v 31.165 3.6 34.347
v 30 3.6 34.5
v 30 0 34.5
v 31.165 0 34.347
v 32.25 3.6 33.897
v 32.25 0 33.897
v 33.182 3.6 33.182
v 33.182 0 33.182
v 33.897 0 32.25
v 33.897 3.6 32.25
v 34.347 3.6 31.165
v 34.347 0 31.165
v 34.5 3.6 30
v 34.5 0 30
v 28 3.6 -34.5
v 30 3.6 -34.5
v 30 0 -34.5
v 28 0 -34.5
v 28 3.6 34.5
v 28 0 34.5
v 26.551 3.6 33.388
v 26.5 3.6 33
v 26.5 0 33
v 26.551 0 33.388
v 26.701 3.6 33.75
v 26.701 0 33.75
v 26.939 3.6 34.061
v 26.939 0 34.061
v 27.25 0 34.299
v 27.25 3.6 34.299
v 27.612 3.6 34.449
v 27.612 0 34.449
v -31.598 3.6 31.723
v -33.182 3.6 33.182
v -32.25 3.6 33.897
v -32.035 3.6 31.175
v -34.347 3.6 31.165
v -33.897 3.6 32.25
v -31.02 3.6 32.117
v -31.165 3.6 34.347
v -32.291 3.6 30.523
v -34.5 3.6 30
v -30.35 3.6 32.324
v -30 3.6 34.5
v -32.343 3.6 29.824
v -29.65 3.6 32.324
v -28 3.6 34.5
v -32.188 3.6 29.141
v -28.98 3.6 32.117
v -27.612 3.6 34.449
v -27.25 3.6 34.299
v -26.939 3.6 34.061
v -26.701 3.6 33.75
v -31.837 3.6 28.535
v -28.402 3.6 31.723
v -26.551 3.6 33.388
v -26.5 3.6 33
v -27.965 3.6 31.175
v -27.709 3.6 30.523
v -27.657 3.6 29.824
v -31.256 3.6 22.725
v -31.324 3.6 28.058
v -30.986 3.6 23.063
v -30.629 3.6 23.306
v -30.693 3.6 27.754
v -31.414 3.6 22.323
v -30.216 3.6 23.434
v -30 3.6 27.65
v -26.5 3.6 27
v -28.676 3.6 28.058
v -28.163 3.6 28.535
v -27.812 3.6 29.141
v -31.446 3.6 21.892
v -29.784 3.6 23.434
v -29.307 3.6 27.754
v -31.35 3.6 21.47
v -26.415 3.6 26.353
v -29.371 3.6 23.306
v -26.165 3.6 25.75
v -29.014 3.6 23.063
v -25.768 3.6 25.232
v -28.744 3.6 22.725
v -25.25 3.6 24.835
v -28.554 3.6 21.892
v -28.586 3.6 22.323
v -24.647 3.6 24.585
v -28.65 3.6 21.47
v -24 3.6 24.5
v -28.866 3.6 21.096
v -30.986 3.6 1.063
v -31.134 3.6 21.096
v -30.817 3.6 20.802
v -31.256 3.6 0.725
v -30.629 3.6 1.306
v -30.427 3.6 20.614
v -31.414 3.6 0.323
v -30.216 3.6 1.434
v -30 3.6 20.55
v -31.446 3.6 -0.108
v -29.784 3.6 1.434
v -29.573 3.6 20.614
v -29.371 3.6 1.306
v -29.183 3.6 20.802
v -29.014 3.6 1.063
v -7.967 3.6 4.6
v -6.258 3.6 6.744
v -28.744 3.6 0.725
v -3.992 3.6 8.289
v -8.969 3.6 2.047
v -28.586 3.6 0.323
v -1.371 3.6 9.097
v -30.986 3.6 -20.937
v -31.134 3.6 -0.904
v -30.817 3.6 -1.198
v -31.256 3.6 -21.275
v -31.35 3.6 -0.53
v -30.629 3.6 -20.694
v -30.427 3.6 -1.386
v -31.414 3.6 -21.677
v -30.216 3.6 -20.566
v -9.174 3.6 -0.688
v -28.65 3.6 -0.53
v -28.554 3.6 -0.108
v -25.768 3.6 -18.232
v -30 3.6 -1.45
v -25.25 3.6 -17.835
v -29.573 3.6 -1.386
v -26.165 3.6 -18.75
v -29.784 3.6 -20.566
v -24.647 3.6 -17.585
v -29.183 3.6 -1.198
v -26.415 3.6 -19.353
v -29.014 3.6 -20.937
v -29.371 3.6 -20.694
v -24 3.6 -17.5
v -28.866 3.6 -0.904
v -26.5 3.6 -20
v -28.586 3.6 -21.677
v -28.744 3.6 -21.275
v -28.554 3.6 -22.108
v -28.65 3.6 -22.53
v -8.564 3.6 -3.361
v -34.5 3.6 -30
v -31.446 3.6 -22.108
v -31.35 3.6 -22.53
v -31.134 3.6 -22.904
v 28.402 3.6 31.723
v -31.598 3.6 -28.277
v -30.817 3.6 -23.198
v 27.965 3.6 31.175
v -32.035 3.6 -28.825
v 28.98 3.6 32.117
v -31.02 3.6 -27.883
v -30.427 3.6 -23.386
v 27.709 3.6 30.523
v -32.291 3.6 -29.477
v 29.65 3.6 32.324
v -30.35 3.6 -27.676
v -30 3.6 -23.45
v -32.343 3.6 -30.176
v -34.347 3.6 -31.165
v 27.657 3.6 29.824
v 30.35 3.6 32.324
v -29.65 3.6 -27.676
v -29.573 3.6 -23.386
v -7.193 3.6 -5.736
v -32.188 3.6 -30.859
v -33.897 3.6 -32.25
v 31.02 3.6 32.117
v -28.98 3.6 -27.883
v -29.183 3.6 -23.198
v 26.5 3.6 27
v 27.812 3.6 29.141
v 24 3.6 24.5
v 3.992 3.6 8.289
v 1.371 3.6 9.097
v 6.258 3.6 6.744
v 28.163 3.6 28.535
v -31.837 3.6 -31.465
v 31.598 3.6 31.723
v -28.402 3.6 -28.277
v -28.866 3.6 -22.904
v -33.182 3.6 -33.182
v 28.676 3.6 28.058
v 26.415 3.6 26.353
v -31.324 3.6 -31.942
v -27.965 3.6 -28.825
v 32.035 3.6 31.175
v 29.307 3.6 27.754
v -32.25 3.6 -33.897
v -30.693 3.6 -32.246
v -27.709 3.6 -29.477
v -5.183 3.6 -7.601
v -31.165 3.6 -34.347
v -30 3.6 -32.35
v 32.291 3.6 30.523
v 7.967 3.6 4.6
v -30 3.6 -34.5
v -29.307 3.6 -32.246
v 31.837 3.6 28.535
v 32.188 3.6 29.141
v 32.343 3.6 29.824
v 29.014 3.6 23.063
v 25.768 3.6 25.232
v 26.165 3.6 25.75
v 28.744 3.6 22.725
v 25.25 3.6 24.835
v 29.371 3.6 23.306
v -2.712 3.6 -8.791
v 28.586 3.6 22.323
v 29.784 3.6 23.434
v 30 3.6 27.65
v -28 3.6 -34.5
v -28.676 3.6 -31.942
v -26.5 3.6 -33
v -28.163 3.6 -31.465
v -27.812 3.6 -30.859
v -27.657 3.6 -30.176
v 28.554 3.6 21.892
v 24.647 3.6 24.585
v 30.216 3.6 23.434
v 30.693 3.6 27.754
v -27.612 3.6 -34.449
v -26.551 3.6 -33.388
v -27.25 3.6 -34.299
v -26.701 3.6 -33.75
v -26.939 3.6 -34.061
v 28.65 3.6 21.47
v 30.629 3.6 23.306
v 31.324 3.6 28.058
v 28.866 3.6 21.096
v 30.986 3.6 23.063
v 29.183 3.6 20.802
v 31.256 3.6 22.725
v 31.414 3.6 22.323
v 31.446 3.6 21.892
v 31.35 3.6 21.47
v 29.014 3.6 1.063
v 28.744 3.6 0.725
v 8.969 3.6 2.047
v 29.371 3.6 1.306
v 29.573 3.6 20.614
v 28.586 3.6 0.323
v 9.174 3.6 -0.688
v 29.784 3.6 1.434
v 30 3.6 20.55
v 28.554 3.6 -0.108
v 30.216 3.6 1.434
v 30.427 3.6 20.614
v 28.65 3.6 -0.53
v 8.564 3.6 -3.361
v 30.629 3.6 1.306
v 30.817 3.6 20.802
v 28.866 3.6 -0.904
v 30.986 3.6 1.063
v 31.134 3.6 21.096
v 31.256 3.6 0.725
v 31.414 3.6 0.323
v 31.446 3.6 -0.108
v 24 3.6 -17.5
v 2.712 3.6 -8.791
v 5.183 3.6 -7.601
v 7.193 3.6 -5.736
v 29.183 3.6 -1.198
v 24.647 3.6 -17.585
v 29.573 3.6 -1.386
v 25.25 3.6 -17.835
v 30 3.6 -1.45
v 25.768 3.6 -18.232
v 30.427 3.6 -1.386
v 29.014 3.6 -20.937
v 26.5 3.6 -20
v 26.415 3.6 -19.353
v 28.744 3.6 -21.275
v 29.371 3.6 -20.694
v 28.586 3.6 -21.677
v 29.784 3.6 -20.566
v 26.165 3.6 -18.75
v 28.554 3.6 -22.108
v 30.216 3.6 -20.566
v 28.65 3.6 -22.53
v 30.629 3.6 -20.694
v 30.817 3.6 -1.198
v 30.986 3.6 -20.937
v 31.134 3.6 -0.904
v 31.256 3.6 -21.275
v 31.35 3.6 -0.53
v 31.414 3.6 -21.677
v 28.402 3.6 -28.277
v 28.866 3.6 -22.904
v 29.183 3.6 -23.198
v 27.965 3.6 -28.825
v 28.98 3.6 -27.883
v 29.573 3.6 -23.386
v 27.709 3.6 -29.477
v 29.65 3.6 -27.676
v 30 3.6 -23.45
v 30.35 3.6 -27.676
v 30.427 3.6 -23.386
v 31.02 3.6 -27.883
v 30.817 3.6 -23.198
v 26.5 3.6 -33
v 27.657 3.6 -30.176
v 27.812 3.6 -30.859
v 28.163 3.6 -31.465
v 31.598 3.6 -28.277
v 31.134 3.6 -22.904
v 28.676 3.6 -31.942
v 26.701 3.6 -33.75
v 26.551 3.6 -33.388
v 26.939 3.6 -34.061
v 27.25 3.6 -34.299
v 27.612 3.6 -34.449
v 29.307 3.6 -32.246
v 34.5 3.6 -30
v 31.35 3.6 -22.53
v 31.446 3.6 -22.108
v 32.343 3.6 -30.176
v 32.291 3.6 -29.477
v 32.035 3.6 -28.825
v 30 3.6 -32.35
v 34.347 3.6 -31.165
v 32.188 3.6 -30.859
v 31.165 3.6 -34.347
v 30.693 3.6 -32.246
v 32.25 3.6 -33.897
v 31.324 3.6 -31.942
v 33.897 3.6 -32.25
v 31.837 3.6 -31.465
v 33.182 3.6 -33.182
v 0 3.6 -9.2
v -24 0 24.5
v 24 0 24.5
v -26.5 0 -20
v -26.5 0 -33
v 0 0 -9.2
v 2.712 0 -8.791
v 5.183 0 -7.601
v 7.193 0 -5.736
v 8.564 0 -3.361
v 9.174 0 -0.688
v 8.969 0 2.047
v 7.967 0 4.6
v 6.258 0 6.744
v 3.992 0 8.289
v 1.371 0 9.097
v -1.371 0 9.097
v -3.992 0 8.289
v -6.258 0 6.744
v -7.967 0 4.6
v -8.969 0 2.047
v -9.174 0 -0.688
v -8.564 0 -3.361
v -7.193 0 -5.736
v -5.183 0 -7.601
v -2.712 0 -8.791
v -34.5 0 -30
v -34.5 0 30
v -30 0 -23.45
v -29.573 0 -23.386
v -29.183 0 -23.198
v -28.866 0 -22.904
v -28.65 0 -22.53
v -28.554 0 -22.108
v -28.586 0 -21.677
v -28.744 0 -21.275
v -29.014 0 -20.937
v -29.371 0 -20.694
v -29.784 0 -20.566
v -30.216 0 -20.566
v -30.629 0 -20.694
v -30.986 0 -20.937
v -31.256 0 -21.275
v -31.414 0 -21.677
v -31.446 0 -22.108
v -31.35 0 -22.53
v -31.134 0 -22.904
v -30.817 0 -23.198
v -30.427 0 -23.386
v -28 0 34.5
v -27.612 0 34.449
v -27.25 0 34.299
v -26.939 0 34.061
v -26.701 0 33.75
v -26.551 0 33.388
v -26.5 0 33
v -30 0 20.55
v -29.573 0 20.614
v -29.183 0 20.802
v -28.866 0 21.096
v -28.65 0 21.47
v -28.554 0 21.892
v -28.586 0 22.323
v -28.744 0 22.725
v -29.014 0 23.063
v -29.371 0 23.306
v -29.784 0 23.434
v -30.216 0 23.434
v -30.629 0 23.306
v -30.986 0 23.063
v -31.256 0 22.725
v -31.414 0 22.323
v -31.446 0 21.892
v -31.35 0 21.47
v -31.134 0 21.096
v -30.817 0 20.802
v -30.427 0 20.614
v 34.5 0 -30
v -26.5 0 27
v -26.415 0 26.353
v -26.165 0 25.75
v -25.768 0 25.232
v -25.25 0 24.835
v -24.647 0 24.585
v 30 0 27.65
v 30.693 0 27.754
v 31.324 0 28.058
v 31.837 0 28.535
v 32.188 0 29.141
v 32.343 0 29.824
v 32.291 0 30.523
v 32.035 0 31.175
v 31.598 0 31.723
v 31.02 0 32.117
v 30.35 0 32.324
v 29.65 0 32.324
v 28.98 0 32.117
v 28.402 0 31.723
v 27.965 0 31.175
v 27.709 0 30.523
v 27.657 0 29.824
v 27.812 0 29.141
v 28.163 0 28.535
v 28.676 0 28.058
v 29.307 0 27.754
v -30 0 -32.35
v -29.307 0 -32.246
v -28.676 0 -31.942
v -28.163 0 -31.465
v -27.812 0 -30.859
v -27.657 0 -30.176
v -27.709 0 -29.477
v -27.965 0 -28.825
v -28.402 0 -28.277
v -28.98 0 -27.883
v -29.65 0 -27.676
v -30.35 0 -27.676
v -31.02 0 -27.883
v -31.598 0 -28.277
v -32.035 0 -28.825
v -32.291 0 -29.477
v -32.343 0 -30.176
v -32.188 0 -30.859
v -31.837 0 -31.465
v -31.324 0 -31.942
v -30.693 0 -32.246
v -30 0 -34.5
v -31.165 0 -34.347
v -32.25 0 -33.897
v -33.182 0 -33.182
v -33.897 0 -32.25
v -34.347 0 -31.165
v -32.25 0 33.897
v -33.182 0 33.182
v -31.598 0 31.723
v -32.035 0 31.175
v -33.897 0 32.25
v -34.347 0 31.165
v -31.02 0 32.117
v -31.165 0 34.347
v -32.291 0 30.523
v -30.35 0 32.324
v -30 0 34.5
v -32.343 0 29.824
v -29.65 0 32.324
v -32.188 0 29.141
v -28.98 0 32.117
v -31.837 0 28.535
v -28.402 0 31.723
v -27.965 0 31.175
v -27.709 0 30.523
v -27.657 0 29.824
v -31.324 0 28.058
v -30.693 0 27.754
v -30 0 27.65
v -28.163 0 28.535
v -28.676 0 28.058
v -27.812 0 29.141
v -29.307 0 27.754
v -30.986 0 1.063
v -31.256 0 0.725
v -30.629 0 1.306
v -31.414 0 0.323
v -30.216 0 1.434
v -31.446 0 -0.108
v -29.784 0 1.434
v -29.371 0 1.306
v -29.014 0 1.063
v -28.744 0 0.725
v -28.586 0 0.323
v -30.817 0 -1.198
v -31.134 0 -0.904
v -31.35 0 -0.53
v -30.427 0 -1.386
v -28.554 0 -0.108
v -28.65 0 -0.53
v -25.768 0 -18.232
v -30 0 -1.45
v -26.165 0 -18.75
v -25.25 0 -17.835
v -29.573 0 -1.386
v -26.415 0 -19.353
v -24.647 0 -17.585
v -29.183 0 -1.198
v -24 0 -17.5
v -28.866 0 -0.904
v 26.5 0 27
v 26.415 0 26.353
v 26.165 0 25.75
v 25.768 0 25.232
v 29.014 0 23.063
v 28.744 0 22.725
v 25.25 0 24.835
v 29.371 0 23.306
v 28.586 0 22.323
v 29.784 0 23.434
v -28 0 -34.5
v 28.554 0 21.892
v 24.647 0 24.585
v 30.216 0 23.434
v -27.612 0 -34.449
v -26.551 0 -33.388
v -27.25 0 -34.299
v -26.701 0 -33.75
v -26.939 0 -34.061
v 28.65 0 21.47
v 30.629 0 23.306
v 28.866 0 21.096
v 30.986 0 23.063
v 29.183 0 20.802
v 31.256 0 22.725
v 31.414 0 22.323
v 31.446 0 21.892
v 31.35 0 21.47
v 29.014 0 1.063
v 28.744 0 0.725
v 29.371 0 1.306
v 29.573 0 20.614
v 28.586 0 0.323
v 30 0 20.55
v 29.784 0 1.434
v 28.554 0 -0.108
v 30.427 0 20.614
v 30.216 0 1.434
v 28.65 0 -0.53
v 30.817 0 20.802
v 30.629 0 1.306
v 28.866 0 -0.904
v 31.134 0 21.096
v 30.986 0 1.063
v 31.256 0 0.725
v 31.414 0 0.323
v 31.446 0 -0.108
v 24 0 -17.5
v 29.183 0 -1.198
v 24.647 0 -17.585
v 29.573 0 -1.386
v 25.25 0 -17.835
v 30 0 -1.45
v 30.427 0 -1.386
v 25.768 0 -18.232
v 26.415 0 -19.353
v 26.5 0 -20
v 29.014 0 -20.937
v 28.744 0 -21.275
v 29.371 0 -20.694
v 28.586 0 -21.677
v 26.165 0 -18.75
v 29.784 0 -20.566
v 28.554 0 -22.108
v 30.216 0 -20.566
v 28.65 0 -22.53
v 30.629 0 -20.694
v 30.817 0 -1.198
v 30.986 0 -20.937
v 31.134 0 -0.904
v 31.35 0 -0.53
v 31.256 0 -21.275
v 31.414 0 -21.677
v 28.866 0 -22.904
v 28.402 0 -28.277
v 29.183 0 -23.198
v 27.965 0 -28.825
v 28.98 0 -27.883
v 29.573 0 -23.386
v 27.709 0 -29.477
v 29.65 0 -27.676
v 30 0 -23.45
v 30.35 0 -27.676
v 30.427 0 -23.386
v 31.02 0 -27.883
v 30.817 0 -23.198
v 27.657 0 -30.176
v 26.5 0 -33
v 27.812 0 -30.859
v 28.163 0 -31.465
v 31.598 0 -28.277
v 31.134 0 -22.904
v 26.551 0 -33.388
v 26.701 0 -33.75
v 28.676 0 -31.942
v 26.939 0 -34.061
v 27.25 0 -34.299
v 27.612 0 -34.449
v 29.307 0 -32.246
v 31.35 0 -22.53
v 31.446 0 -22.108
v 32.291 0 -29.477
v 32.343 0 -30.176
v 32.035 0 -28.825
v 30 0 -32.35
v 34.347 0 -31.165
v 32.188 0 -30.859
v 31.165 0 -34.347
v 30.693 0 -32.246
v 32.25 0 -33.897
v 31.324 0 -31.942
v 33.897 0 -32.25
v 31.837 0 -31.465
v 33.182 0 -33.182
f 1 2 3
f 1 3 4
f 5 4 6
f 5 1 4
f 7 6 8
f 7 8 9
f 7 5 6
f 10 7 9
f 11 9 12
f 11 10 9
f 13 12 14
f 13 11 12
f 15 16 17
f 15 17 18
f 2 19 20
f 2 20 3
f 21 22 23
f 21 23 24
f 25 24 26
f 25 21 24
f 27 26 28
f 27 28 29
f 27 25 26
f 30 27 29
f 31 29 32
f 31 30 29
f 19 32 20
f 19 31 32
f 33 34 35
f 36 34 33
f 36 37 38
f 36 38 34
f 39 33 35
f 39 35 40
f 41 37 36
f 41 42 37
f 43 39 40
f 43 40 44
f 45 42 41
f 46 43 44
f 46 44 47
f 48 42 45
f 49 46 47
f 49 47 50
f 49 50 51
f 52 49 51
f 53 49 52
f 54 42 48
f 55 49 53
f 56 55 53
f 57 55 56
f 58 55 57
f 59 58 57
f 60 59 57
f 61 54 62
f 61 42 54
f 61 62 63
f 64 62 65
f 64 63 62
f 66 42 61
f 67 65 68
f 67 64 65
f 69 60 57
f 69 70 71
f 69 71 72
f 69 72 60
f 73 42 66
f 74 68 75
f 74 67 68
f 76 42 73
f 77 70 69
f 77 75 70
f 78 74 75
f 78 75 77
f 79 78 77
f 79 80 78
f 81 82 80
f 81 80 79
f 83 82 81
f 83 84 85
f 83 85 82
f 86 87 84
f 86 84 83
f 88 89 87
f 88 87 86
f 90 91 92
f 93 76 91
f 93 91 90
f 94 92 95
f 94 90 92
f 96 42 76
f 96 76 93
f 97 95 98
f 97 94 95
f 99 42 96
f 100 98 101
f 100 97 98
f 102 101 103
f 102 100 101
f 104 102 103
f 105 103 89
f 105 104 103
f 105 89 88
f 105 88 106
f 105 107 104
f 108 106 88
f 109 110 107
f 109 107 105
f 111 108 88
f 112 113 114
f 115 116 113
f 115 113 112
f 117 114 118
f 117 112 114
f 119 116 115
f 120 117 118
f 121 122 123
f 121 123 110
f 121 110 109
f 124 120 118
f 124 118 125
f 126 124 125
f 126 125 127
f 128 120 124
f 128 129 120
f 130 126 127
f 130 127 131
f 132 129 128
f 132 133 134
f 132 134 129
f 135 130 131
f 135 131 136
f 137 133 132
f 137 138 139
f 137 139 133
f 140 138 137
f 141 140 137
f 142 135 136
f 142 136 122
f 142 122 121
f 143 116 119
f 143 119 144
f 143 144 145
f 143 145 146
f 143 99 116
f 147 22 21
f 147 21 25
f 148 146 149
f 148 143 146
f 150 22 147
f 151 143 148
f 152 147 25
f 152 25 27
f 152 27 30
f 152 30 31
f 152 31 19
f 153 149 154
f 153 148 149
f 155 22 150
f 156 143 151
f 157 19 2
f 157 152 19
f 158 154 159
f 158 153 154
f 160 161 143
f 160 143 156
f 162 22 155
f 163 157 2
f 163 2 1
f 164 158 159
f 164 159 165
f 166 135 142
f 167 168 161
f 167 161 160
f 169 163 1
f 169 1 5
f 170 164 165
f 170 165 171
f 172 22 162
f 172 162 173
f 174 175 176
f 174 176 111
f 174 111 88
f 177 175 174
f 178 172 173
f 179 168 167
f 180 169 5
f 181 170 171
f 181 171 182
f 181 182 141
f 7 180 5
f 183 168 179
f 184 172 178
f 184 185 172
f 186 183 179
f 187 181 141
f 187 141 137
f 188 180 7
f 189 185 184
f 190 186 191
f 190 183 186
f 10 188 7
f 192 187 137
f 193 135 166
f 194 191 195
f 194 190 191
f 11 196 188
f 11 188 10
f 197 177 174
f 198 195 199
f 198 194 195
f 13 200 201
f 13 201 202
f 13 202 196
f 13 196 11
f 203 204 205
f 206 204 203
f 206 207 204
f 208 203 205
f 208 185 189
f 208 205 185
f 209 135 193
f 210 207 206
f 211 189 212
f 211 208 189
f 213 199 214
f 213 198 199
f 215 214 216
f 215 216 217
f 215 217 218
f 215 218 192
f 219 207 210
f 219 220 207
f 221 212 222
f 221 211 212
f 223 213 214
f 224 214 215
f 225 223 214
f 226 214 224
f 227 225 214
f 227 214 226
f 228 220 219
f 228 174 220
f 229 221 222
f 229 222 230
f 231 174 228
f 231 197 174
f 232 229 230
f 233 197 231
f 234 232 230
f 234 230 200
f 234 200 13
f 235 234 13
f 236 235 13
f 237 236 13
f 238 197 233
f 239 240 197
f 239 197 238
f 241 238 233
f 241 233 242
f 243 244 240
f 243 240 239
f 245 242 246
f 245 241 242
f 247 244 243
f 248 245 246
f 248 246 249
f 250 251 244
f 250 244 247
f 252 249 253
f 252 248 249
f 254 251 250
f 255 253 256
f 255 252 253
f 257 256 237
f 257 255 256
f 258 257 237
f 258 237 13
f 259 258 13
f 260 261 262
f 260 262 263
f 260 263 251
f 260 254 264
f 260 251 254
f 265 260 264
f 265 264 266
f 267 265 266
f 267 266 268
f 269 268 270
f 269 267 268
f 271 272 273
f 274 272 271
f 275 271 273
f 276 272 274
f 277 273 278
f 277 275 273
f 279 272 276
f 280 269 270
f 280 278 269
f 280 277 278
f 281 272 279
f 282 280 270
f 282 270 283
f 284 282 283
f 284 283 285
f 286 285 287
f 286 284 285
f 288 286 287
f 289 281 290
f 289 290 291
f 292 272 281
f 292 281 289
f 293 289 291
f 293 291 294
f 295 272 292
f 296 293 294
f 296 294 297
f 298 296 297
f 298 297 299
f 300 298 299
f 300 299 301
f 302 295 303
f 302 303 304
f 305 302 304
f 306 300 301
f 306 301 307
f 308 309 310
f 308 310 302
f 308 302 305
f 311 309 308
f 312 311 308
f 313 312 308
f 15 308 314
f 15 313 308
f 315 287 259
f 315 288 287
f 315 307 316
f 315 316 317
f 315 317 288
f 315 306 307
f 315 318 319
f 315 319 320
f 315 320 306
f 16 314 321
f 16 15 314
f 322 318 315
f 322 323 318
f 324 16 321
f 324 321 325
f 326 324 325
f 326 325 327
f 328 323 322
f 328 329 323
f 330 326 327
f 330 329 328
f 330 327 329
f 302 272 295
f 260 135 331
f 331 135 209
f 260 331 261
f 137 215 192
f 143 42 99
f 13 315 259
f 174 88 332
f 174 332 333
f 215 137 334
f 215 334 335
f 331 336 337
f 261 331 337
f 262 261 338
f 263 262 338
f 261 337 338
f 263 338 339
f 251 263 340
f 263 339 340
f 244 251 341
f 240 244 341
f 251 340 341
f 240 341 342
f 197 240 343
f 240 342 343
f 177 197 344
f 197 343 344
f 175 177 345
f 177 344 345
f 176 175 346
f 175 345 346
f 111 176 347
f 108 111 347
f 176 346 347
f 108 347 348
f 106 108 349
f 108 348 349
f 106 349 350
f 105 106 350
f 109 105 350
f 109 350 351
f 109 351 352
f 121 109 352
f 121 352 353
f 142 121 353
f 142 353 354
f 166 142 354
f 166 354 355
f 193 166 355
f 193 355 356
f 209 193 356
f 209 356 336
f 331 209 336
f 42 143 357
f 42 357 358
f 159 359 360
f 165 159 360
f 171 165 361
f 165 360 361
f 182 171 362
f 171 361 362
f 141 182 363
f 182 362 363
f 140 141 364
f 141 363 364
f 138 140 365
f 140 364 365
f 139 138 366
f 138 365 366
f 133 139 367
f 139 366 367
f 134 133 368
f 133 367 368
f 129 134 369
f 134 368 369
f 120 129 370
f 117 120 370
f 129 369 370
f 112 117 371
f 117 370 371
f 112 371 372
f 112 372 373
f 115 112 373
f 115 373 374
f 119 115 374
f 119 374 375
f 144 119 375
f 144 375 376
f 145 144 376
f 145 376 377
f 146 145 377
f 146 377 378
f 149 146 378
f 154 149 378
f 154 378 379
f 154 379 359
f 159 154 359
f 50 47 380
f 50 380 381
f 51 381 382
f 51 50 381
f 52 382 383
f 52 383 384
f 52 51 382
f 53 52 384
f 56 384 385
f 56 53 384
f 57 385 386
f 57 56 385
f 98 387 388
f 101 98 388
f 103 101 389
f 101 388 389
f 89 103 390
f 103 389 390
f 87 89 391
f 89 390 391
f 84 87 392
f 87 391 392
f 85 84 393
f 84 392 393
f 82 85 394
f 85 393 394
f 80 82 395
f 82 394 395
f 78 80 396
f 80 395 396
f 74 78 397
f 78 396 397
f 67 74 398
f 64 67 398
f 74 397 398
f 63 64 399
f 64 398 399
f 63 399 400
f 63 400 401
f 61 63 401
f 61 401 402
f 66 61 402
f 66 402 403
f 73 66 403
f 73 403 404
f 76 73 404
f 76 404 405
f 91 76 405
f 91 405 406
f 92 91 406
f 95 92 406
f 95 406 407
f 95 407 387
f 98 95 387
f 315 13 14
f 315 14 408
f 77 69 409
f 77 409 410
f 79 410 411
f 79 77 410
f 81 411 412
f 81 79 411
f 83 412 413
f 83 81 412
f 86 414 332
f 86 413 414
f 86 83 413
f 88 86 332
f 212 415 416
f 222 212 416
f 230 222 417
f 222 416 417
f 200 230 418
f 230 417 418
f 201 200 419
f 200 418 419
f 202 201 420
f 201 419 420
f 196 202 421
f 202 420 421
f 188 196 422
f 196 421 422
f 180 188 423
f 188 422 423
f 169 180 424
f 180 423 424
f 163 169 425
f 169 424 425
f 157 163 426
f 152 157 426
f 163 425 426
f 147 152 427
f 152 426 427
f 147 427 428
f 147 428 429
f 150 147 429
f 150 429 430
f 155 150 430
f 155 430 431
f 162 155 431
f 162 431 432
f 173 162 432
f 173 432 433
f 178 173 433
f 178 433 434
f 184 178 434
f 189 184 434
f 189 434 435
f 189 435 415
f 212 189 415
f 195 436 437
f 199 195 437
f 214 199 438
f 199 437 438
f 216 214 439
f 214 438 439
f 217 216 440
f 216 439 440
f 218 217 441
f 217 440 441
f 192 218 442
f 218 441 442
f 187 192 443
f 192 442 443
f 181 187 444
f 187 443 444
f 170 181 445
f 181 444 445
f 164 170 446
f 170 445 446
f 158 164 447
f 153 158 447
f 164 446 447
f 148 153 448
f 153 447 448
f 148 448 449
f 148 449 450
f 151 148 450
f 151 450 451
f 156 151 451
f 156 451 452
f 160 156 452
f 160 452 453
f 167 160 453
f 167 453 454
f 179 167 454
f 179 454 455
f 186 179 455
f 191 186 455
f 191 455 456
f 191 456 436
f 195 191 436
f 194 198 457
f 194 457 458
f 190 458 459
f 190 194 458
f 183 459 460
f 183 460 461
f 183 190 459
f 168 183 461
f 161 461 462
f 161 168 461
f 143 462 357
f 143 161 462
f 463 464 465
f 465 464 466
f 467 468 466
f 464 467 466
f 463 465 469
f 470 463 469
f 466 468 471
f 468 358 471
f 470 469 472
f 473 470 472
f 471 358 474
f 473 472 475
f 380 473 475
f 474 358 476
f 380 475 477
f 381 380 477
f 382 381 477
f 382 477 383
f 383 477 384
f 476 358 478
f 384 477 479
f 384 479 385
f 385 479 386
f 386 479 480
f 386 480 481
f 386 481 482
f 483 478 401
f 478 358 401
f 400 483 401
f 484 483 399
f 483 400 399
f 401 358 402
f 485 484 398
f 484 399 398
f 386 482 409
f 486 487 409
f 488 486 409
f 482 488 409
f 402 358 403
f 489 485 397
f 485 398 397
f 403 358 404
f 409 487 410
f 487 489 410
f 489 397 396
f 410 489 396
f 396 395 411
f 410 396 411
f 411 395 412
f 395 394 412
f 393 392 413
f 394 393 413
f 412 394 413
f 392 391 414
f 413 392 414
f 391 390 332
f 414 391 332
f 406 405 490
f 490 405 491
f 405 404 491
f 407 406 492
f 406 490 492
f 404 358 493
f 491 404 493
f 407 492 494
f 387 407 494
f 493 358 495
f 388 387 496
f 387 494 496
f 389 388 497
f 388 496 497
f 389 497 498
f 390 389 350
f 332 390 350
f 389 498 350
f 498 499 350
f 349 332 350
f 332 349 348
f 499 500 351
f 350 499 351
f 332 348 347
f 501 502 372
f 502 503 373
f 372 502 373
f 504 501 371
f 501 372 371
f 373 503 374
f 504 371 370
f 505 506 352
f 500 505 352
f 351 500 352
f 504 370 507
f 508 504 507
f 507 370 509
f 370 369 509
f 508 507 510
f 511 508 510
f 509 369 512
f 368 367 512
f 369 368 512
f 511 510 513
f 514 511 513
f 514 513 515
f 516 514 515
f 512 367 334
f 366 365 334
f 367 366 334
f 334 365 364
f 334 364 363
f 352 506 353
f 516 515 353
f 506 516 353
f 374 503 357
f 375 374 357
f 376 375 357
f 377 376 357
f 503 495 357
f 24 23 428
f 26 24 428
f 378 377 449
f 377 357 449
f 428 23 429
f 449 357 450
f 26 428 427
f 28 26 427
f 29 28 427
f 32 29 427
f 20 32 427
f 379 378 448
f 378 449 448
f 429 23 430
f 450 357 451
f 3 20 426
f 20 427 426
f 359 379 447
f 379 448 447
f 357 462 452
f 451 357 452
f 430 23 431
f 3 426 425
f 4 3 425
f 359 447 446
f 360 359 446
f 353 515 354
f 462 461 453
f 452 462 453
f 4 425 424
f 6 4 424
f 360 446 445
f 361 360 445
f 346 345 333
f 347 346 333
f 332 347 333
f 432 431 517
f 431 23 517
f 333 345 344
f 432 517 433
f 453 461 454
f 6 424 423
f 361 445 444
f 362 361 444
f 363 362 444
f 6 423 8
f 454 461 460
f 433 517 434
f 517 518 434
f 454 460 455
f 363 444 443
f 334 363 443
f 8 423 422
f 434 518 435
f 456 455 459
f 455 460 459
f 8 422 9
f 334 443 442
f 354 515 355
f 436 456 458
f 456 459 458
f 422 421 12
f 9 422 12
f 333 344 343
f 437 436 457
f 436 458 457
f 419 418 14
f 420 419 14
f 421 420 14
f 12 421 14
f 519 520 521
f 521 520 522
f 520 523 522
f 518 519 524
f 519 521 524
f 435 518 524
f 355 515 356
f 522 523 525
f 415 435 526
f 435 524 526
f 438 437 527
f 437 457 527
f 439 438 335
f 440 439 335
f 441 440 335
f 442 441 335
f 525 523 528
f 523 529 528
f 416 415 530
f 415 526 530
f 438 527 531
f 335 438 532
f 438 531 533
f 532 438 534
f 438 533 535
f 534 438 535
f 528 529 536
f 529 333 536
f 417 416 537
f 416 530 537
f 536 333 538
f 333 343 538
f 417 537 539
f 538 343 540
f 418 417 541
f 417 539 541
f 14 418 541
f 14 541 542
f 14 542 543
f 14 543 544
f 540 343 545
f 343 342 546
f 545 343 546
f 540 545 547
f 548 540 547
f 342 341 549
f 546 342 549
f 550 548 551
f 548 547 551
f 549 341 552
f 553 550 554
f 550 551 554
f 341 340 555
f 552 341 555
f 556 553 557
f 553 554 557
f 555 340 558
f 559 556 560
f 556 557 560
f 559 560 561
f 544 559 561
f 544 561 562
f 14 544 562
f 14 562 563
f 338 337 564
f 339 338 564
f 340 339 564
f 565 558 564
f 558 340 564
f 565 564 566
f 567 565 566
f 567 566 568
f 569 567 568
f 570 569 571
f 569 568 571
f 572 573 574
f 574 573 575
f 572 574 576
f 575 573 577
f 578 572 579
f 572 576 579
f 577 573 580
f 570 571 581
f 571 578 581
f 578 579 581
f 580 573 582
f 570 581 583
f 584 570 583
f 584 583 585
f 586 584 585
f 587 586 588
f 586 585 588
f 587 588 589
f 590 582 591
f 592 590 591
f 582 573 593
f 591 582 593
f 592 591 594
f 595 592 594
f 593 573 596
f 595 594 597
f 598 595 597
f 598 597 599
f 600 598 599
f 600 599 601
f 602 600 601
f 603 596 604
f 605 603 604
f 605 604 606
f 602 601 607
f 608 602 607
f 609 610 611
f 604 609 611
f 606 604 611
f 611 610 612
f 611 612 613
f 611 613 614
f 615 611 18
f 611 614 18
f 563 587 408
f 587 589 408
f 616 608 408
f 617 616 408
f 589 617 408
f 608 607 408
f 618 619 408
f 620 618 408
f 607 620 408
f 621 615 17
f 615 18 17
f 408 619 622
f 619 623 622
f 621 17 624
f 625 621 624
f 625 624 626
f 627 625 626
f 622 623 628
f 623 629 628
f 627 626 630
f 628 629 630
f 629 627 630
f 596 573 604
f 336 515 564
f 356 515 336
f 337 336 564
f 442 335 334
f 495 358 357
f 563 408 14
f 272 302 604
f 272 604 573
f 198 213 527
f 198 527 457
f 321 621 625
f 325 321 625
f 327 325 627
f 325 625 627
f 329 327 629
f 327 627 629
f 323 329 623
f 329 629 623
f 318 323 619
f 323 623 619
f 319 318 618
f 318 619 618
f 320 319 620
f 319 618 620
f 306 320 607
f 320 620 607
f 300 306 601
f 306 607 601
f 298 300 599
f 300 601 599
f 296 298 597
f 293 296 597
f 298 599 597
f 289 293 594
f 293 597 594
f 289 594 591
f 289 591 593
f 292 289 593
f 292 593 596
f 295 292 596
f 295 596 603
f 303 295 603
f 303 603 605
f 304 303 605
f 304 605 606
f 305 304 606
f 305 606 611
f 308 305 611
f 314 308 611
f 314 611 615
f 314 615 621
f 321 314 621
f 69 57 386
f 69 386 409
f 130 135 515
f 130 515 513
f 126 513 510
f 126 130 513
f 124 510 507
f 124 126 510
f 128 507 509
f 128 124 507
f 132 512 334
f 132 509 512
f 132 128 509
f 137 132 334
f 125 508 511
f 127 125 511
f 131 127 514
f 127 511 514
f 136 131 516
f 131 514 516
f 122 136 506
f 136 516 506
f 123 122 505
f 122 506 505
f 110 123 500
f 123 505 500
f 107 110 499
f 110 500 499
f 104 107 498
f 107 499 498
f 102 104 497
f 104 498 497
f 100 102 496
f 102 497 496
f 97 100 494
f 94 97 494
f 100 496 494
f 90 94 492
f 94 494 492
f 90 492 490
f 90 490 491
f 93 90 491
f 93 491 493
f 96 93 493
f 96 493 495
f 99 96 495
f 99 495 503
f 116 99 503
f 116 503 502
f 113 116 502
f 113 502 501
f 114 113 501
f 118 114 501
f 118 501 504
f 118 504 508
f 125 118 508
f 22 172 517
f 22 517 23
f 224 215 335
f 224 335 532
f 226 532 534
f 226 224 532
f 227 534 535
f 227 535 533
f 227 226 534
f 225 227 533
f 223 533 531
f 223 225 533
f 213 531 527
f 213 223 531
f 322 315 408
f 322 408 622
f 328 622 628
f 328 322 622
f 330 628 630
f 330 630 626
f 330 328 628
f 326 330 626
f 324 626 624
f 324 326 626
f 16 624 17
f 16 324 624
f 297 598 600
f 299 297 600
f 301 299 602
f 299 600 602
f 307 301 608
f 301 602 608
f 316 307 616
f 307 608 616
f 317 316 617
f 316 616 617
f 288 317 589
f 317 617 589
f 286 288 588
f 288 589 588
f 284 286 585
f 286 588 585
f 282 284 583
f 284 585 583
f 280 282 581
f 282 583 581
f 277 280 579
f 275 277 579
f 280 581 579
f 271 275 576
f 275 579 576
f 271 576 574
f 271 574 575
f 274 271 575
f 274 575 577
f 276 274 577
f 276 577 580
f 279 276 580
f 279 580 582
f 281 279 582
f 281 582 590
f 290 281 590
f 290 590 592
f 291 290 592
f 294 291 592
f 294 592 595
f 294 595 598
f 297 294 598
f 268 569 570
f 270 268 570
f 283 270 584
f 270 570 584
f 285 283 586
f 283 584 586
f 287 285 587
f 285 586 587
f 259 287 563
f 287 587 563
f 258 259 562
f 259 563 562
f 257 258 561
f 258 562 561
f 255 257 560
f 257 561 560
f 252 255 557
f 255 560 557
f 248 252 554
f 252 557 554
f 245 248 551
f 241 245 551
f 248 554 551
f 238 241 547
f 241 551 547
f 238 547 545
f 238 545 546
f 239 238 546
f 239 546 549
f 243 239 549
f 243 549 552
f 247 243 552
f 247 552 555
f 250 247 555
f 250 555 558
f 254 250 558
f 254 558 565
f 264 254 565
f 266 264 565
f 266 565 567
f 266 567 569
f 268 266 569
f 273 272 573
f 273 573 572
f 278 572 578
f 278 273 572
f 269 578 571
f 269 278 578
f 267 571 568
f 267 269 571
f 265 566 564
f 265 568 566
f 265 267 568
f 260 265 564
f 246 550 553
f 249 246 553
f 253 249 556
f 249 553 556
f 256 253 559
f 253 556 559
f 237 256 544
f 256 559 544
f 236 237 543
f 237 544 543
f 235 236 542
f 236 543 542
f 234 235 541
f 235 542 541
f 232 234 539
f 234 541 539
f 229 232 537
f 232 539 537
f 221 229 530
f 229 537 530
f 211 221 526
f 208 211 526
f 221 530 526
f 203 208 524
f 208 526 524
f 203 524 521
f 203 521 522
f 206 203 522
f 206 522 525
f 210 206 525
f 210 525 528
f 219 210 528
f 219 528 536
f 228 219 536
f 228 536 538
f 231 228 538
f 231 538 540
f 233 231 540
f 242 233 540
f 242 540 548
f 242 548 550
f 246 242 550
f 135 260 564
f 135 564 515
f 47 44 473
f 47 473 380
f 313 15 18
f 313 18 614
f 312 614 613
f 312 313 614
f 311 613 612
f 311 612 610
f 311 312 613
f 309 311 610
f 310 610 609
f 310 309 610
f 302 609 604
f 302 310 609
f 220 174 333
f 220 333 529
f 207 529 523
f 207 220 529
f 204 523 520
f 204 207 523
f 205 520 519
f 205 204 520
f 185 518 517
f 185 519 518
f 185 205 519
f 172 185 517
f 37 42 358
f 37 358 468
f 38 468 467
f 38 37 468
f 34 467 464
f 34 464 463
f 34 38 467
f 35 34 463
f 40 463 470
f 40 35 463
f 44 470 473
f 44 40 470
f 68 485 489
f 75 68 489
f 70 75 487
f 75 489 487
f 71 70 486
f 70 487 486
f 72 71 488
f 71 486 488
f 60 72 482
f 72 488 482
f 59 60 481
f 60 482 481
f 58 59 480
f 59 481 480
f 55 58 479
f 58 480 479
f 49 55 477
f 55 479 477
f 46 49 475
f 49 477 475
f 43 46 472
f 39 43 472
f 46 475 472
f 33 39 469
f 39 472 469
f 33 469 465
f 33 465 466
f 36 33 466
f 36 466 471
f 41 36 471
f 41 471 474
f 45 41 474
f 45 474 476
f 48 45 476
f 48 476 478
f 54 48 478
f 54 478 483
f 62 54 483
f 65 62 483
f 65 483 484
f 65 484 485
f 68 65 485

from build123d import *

# Parameters (mm, degrees)
SKETCH1_W           = 70
SKETCH1_H           = 70
BOSS_EXTRUDE1_DEPTH = 3.6
SKETCH2_W           = 87.76827376
SKETCH2_H           = 85.716468358
CUT_EXTRUDE1_DEPTH  = 10
SKETCH4_R           = 2.35
SKETCH4_R_2         = 1.45
SKETCH4_R_3         = 9.2
CUT_EXTRUDE2_DEPTH  = 10


with BuildPart() as part:
    # Sketch1 → Boss-Extrude1 (new body)
    with BuildSketch(Plane(origin=(0, 0, 0), x_dir=(1, 0, 0), z_dir=(0, 1, 0))):
        Rectangle(SKETCH1_W, SKETCH1_H)
    extrude(amount=BOSS_EXTRUDE1_DEPTH)

    # Sketch2 → Cut-Extrude1 (cut)
    with BuildSketch(Plane(origin=(0, 3.6, 0), x_dir=(1, 0, 0), z_dir=(0, 1, 0))):
        Rectangle(SKETCH2_W, SKETCH2_H)
        with BuildLine():
            Line((30, 34.5), (28, 34.5))
            ThreePointArc((28, 34.5), (26.939339828, 34.060660172), (26.5, 33))
            Line((26.5, 33), (26.5, 20))
            ThreePointArc((26.5, 20), (25.767766953, 18.232233047), (24, 17.5))
            Line((24, 17.5), (-24, 17.5))
            ThreePointArc((-24, 17.5), (-25.767766953, 18.232233047), (-26.5, 20))
            Line((-26.5, 20), (-26.5, 33))
            ThreePointArc((-26.5, 33), (-26.939339828, 34.060660172), (-28, 34.5))
            Line((-28, 34.5), (-30, 34.5))
            ThreePointArc((-30, 34.5), (-33.181980515, 33.181980515), (-34.5, 30))
            Line((-34.5, 30), (-34.5, -30))
            ThreePointArc((-34.5, -30), (-33.181980515, -33.181980515), (-30, -34.5))
            Line((-30, -34.5), (-28, -34.5))
            ThreePointArc((-28, -34.5), (-26.939339828, -34.060660172), (-26.5, -33))
            Line((-26.5, -33), (-26.5, -27))
            ThreePointArc((-26.5, -27), (-25.767766953, -25.232233047), (-24, -24.5))
            Line((-24, -24.5), (24, -24.5))
            ThreePointArc((24, -24.5), (25.767766953, -25.232233047), (26.5, -27))
            Line((26.5, -27), (26.5, -33))
            ThreePointArc((26.5, -33), (26.939339828, -34.060660172), (28, -34.5))
            Line((28, -34.5), (30, -34.5))
            ThreePointArc((30, -34.5), (33.181980515, -33.181980515), (34.5, -30))
            Line((34.5, -30), (34.5, 30))
            ThreePointArc((34.5, 30), (33.181980515, 33.181980515), (30, 34.5))
        make_face(mode=Mode.SUBTRACT)
    extrude(amount=-CUT_EXTRUDE1_DEPTH, mode=Mode.SUBTRACT)

    # Sketch4 → Cut-Extrude2 (cut)
    with BuildSketch(Plane.XZ):
        with Locations(Location((30, -30, 0), (0, 0, 270))):
            Circle(SKETCH4_R)
        with Locations(Location((30, -22, 0), (0, 0, 270))):
            Circle(SKETCH4_R_2)
        with Locations(Location((30, 0, 0), (0, 0, 270))):
            Circle(SKETCH4_R_2)
        with Locations(Location((30, 22, 0), (0, 0, 270))):
            Circle(SKETCH4_R_2)
        with Locations(Location((30, 30, 0), (0, 0, 270))):
            Circle(SKETCH4_R)
        with Locations(Location((-30, -30, 0), (0, 0, 270))):
            Circle(SKETCH4_R)
        with Locations(Location((-30, -22, 0), (0, 0, 270))):
            Circle(SKETCH4_R_2)
        with Locations(Location((0, 0, 0), (0, 0, 270))):
            Circle(SKETCH4_R_3)
        with Locations(Location((-30, 0, 0), (0, 0, 270))):
            Circle(SKETCH4_R_2)
        with Locations(Location((-30, 22, 0), (0, 0, 270))):
            Circle(SKETCH4_R_2)
        with Locations(Location((-30, 30, 0), (0, 0, 270))):
            Circle(SKETCH4_R)
    extrude(amount=-CUT_EXTRUDE2_DEPTH, mode=Mode.SUBTRACT)


solid = part.part
